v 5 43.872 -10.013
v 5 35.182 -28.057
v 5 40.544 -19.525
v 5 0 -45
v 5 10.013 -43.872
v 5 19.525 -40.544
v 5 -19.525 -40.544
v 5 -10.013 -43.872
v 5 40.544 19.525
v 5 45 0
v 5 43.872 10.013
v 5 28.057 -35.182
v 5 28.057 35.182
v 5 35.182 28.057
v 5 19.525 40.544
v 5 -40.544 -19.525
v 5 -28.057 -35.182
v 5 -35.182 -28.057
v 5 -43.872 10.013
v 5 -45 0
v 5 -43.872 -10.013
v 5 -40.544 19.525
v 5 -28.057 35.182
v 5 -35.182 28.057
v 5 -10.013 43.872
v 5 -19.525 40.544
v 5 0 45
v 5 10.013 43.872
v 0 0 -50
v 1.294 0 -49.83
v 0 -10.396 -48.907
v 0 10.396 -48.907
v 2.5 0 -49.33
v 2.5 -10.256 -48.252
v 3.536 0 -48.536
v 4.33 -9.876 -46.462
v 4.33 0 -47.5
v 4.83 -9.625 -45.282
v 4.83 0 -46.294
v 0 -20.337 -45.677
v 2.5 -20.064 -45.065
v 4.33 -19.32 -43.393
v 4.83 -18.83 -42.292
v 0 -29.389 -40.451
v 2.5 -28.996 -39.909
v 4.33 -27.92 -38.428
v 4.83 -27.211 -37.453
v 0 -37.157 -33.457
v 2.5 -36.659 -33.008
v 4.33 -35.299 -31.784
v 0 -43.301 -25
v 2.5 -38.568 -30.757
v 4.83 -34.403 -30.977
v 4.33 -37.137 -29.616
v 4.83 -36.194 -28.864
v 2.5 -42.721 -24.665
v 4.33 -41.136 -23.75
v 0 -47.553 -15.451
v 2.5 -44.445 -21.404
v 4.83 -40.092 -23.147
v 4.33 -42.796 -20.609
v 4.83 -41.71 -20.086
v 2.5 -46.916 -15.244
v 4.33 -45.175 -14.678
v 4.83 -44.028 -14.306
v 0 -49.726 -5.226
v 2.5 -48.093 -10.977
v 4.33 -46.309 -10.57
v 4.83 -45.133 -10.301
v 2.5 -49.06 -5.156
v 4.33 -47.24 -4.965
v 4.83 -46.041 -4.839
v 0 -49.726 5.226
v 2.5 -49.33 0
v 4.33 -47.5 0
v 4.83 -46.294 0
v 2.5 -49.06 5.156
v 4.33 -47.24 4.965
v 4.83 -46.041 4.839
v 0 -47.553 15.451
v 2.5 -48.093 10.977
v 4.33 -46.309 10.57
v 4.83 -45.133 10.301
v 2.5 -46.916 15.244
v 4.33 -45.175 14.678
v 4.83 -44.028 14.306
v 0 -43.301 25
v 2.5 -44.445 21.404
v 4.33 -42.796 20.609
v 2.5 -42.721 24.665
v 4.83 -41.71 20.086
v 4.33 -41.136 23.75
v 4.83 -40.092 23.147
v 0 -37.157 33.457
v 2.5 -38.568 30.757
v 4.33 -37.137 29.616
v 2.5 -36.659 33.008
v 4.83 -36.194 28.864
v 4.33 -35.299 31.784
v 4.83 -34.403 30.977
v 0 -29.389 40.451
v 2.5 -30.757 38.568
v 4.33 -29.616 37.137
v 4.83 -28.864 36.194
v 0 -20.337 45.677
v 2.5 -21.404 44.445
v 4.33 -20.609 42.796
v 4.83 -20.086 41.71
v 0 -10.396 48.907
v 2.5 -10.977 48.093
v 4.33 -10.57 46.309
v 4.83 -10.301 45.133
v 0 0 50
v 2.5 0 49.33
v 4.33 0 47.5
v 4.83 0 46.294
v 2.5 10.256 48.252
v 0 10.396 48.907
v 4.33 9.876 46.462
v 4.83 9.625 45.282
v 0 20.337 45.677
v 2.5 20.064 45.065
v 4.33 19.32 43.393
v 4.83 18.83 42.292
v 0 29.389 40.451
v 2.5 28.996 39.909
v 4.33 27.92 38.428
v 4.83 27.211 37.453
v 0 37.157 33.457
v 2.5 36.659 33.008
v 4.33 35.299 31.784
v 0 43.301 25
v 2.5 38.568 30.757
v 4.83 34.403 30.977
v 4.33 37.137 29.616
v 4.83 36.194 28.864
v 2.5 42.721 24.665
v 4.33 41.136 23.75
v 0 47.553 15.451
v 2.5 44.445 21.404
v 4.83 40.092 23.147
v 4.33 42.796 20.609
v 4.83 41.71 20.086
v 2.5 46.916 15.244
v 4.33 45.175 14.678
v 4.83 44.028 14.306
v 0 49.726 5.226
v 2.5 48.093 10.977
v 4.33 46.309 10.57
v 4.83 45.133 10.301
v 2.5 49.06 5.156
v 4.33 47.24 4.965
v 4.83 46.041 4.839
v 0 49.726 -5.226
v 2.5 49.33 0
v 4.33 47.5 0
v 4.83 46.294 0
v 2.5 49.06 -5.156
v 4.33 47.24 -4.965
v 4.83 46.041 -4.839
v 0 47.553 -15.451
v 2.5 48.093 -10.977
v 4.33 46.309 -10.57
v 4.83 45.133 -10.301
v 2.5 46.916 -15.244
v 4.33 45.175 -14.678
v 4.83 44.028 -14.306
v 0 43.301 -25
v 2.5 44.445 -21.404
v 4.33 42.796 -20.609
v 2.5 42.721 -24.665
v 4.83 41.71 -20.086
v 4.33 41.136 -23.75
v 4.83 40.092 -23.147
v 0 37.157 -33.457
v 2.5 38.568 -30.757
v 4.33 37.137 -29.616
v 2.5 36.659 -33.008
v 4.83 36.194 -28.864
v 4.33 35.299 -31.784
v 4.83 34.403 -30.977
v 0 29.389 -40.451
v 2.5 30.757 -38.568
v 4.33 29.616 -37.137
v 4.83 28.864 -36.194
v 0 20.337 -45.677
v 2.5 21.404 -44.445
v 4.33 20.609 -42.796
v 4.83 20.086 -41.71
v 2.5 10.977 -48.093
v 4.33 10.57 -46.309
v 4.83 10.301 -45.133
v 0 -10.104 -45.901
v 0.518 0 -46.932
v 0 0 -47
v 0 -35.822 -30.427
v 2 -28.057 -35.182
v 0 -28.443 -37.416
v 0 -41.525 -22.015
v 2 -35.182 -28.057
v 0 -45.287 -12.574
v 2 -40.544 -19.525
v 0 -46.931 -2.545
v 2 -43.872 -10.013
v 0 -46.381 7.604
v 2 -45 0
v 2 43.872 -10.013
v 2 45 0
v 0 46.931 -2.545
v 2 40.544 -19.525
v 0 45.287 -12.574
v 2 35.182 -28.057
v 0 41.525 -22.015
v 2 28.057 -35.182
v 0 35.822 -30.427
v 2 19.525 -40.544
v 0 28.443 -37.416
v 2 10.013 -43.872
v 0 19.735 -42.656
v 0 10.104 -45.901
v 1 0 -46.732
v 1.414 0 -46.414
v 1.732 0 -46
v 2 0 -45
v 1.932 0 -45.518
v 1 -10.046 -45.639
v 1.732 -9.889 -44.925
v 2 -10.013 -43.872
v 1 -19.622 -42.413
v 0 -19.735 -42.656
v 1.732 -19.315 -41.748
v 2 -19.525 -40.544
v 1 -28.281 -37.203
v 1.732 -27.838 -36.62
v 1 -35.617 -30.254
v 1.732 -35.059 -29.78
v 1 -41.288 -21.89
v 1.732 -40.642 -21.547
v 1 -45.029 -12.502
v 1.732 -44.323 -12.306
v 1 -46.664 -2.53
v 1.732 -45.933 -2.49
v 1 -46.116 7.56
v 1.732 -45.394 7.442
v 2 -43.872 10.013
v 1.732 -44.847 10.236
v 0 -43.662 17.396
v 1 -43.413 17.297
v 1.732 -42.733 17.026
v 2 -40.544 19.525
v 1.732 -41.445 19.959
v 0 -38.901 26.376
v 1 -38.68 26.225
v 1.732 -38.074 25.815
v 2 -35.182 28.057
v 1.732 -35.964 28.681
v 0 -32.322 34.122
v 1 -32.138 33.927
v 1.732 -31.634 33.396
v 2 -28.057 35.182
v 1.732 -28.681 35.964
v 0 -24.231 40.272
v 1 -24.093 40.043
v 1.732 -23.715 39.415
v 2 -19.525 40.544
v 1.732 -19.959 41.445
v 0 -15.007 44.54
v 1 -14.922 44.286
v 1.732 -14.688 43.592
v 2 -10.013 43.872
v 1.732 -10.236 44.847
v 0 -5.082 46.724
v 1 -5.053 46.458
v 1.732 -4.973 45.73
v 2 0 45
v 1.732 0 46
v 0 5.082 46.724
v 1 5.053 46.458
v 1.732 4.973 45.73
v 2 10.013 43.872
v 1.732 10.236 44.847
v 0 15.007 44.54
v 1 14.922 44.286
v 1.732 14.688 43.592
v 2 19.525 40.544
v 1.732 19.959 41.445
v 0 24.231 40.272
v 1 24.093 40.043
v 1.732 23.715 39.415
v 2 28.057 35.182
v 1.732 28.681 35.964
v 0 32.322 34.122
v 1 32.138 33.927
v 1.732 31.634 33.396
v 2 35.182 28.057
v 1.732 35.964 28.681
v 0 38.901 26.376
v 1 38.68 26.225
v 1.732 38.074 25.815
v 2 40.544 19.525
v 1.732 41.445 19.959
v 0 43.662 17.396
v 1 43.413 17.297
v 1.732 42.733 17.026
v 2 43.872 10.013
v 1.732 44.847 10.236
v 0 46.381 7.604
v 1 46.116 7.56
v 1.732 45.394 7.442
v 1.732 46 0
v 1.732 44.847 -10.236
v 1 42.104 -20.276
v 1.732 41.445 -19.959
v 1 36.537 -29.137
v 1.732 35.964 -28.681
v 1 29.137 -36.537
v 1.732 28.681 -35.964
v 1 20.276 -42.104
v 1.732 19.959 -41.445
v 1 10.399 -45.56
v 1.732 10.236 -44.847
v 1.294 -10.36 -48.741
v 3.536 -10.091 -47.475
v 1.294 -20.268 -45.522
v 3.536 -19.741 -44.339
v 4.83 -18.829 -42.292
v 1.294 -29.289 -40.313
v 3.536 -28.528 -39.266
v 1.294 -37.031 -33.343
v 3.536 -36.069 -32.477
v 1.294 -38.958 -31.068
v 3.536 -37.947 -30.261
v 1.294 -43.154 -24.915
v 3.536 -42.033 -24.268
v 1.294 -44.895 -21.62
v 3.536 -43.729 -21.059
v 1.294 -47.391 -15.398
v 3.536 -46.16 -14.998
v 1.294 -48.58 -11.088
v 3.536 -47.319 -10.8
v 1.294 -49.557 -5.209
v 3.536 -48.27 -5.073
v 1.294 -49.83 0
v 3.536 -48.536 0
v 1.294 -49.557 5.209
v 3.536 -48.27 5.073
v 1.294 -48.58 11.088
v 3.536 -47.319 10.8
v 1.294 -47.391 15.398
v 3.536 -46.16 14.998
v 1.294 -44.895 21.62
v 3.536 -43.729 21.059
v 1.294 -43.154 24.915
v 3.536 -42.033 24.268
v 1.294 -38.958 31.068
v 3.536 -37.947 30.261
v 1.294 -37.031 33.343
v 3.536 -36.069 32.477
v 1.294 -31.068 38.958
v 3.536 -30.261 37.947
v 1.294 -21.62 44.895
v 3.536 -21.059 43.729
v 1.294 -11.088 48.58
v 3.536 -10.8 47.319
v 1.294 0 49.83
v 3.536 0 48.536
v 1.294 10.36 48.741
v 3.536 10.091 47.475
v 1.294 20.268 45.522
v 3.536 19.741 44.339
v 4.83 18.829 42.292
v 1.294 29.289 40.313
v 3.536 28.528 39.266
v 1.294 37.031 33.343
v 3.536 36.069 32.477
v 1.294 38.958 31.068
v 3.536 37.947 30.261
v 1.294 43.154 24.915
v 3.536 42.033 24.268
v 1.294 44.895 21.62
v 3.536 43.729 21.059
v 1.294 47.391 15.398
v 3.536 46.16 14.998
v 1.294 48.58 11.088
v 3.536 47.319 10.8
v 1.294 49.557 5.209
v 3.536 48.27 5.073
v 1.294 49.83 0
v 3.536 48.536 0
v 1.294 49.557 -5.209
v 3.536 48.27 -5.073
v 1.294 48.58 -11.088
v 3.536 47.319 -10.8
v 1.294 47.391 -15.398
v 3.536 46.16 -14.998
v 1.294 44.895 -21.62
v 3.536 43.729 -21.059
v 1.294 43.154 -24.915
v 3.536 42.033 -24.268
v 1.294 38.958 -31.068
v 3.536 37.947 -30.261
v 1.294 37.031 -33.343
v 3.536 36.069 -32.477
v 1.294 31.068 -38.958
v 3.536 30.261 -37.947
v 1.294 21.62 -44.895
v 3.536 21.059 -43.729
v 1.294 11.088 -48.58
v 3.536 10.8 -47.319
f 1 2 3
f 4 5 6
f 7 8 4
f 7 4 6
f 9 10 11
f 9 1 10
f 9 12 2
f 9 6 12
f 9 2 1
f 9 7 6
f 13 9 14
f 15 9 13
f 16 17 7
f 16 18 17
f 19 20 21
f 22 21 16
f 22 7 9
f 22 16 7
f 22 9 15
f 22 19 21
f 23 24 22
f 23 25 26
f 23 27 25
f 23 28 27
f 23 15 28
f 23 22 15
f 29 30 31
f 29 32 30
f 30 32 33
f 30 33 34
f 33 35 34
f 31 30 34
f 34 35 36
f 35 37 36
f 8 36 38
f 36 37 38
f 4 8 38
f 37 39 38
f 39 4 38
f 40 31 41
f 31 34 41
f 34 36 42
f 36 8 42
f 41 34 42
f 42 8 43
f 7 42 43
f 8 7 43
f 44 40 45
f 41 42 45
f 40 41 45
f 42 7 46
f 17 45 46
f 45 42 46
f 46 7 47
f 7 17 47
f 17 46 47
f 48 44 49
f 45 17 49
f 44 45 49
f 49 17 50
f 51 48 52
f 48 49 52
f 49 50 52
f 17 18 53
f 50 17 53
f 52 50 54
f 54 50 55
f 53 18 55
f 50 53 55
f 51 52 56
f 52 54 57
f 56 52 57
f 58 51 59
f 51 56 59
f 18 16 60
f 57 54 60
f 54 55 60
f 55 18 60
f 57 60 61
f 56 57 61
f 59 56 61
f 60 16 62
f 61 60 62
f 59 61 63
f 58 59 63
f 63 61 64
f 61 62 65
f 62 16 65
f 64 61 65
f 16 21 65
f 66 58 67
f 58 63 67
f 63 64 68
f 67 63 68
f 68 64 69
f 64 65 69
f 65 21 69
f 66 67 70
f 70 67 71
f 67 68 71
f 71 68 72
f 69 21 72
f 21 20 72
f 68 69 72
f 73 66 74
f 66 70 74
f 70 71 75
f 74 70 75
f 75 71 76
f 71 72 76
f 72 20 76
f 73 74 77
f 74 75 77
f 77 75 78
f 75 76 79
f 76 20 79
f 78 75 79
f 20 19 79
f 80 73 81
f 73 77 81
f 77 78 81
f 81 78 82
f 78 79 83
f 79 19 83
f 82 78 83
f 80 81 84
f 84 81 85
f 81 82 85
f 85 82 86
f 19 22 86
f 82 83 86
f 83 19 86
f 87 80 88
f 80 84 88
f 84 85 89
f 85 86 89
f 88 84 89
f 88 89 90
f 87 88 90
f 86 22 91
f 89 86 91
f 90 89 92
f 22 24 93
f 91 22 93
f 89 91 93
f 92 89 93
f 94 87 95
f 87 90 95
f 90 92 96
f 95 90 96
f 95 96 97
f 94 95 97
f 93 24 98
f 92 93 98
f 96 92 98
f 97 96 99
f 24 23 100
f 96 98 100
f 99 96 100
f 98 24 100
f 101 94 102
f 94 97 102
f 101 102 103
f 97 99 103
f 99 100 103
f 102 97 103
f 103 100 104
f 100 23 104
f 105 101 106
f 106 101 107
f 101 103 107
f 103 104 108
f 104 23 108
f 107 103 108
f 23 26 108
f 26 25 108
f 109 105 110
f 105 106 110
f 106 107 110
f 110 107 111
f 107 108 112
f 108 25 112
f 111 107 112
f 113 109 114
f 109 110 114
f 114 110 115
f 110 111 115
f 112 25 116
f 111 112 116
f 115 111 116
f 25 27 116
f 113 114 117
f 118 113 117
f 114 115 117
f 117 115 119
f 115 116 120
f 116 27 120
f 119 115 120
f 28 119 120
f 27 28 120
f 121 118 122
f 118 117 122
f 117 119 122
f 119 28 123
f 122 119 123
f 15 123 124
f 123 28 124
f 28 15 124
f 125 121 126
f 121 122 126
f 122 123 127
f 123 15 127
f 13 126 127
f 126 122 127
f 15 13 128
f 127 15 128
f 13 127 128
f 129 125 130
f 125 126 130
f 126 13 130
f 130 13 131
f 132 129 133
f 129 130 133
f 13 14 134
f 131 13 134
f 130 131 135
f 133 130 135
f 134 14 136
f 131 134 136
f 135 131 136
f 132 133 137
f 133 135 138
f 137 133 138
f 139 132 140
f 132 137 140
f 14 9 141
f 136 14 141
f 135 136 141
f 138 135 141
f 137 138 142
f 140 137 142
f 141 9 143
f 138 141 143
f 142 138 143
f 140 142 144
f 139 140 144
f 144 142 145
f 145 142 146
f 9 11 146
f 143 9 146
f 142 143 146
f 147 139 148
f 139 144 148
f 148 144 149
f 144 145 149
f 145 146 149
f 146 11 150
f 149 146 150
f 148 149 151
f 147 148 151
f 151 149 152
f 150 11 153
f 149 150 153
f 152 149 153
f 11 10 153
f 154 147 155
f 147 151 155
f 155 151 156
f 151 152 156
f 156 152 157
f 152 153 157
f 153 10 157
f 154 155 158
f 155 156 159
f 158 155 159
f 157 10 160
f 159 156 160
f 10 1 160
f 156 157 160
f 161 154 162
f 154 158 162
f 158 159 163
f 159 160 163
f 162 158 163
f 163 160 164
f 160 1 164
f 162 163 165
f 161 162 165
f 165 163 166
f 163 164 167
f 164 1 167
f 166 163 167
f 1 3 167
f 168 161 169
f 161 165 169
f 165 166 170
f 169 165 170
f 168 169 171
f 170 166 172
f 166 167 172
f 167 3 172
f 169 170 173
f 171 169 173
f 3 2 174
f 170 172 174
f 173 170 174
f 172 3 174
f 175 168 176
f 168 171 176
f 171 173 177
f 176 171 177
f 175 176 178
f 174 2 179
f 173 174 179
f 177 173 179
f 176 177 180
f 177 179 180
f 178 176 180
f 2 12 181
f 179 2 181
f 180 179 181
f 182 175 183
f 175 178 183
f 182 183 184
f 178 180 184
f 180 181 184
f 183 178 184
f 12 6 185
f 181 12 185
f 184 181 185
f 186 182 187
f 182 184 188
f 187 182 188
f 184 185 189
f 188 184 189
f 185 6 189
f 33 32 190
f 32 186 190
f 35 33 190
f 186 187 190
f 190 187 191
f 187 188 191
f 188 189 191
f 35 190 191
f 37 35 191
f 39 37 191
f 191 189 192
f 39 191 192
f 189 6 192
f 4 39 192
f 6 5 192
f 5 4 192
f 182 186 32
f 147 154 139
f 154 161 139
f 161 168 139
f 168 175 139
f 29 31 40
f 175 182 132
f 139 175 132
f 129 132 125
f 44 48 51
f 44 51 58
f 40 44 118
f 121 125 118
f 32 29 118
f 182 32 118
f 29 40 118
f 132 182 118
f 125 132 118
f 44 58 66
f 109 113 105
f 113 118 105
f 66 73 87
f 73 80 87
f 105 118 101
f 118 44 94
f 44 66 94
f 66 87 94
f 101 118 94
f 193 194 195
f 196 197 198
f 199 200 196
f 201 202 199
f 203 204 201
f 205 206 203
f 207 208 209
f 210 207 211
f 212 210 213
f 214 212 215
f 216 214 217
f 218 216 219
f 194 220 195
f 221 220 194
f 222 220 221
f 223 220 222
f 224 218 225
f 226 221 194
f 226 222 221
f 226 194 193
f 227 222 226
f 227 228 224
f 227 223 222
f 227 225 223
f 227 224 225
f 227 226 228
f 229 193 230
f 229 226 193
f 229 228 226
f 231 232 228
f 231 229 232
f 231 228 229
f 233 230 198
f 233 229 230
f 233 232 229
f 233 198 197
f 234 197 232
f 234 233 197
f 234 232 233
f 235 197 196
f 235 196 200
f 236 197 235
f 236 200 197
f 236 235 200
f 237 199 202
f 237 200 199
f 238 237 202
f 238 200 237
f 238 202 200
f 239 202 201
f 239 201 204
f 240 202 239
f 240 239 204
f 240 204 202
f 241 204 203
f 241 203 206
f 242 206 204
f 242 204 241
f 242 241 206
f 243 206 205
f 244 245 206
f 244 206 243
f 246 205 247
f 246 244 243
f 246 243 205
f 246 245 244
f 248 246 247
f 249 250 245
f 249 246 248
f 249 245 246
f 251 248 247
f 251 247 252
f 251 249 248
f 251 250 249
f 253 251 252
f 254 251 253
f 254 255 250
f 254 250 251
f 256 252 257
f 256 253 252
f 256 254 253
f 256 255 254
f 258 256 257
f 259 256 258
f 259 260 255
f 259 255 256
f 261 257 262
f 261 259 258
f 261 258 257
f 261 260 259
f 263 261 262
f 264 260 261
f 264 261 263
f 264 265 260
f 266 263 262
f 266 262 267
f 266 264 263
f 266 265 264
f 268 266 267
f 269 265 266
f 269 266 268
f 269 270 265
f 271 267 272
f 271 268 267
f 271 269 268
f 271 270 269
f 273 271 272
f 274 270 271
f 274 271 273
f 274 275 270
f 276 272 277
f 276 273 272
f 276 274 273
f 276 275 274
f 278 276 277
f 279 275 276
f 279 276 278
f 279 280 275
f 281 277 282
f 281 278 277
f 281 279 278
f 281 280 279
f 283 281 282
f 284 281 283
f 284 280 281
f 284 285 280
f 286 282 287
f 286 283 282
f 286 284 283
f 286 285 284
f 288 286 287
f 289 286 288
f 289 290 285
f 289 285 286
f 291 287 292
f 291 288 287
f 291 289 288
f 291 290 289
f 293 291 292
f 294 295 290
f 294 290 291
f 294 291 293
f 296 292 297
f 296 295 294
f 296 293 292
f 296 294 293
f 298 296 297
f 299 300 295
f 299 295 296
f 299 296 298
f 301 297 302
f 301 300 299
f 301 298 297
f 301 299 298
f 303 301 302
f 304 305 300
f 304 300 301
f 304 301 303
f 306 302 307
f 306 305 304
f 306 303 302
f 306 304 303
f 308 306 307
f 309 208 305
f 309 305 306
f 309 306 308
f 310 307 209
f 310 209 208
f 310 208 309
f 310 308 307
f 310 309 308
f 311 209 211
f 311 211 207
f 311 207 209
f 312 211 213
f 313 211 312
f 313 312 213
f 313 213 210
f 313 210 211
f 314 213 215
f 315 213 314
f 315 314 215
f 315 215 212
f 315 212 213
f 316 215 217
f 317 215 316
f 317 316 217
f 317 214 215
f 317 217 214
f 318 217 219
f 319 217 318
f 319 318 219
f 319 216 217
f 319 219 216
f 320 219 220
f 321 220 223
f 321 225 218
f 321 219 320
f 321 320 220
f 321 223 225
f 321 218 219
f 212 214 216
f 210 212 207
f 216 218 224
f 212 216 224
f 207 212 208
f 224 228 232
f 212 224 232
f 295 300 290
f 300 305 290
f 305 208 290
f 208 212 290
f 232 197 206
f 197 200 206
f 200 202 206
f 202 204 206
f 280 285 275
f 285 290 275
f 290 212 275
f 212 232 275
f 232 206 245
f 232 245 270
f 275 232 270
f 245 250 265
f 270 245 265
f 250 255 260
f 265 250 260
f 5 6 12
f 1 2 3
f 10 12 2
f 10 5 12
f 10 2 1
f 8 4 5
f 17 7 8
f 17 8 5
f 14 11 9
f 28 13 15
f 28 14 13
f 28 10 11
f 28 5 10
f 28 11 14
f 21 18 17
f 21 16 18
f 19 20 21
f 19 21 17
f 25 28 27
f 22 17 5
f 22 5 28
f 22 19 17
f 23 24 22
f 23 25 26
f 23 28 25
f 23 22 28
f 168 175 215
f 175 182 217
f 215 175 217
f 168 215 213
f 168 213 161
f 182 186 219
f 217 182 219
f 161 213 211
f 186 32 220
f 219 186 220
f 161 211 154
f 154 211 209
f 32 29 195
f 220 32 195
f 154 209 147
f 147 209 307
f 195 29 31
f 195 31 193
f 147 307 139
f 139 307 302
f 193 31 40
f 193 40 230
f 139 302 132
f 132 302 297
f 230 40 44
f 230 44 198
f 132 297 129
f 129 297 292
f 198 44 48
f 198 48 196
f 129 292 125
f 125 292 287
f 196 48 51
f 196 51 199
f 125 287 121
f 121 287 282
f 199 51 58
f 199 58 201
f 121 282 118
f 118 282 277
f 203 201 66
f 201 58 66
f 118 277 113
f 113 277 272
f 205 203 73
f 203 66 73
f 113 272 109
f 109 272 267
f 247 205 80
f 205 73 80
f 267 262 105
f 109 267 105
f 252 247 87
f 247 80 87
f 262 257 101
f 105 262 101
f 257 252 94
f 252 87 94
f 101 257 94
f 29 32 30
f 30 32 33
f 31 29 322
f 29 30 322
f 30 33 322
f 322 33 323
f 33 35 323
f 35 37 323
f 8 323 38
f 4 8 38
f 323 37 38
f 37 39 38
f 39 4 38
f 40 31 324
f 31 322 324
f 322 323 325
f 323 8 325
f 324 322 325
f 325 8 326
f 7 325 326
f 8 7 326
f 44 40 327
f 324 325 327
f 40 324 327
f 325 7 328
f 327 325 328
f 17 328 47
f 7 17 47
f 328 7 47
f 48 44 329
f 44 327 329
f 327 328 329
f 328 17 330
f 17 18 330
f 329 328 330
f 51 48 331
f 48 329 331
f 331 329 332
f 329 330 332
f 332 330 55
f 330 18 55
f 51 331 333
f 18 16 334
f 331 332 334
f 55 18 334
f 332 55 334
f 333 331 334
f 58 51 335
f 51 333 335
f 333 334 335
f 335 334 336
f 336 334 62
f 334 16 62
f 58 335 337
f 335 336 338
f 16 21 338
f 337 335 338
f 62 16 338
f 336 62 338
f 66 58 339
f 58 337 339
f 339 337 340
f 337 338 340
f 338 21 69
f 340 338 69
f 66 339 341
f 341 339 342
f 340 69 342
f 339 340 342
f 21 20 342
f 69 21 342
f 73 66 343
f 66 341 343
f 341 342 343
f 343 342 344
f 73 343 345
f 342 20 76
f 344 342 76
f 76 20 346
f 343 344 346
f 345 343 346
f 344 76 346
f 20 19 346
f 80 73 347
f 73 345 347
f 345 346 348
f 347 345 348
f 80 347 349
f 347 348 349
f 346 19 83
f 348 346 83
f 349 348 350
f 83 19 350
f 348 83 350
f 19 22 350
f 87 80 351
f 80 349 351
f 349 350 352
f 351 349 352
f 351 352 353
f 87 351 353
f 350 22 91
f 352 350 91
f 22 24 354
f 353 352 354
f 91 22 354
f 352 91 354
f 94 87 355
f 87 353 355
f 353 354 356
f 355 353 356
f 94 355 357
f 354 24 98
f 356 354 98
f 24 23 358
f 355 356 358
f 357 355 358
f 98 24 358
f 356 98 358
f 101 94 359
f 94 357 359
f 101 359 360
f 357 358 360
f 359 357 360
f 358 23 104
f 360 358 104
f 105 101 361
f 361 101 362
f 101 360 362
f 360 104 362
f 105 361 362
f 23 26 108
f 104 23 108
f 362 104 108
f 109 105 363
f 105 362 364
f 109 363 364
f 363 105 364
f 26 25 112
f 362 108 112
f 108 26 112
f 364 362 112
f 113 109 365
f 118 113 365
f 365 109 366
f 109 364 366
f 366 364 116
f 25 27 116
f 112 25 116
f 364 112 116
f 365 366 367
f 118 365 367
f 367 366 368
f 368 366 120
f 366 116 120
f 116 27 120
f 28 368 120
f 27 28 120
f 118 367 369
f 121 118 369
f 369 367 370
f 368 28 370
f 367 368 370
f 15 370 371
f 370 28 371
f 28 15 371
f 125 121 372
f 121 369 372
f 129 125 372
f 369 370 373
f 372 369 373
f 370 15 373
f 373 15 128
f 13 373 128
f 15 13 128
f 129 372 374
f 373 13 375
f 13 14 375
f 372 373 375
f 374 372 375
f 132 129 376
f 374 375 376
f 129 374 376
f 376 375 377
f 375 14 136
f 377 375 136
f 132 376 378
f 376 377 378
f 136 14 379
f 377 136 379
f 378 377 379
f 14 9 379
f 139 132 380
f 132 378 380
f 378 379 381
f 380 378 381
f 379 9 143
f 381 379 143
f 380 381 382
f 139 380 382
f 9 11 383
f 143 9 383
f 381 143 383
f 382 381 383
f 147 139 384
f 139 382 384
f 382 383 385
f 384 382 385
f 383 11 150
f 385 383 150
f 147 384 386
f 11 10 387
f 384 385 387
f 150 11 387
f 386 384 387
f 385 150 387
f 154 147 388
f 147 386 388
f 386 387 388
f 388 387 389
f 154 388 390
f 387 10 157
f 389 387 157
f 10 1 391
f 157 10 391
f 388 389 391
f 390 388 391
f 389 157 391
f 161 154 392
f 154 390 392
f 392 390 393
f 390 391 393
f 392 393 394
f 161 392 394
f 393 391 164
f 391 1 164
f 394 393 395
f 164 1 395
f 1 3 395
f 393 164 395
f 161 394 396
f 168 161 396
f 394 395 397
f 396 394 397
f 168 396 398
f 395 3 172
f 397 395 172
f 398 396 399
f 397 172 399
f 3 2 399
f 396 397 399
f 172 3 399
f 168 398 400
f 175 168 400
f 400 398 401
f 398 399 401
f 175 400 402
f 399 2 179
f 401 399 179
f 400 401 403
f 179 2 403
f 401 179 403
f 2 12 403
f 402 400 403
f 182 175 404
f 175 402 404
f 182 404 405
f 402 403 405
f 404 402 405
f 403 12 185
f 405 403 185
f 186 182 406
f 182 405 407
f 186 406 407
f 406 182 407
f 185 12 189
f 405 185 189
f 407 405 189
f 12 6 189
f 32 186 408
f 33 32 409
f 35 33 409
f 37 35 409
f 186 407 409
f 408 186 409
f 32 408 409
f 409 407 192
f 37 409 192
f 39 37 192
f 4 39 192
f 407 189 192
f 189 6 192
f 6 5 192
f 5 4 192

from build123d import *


with BuildPart() as inner:
    # Sketch001 → Revolution001 (revolve)
    with BuildSketch(Plane(origin=(0, 0, 0), x_dir=(-1, 0, 0), z_dir=(0, -1, 0))):
        with BuildLine():
            Line((0, 0), (0, 45))
            Line((0, 45), (0, 47))
            ThreePointArc((0, 47), (-1.414214, 46.414214), (-2, 45))
            Line((-2, 0), (-2, 45))
            Line((0, 0), (-2, 0))
        make_face()
    revolve(axis=Axis((0, 0, 0), (-1, 0, 0)))


with BuildPart() as model:
    # Sketch → Revolution (revolve)
    with BuildSketch(Plane(origin=(0, 0, 0), x_dir=(-1, 0, 0), z_dir=(0, -1, 0))):
        with BuildLine():
            Line((0, 0), (0, 45))
            Line((0, 45), (0, 50))
            ThreePointArc((0, 50), (-3.535527, 48.535541), (-5, 45.000019))
            Line((-5, 0), (-5, 45.000019))
            Line((0, 0), (-5, 0))
        make_face()
    revolve(axis=Axis((0, 0, 0), (-1, 0, 0)))

    # Cut: cut Inner
    add(inner.part, mode=Mode.SUBTRACT)


with BuildPart() as displacedmodel:
    # Sketch002 → Revolution002 (revolve)
    with BuildSketch(Plane(origin=(0, 0, 0), x_dir=(-1, 0, 0), z_dir=(0, -1, 0))):
        with BuildLine():
            Line((0, 0), (0, 45))
            Line((0, 45), (0, 50))
            ThreePointArc((0, 50), (-3.535542, 48.535526), (-5, 44.999978))
            Line((-5, 0), (-5, 44.999978))
            Line((0, 0), (-5, 0))
        make_face()
    revolve(axis=Axis((0, 0, 0), (-1, 0, 0)))


solid = Compound([model.part, displacedmodel.part])
